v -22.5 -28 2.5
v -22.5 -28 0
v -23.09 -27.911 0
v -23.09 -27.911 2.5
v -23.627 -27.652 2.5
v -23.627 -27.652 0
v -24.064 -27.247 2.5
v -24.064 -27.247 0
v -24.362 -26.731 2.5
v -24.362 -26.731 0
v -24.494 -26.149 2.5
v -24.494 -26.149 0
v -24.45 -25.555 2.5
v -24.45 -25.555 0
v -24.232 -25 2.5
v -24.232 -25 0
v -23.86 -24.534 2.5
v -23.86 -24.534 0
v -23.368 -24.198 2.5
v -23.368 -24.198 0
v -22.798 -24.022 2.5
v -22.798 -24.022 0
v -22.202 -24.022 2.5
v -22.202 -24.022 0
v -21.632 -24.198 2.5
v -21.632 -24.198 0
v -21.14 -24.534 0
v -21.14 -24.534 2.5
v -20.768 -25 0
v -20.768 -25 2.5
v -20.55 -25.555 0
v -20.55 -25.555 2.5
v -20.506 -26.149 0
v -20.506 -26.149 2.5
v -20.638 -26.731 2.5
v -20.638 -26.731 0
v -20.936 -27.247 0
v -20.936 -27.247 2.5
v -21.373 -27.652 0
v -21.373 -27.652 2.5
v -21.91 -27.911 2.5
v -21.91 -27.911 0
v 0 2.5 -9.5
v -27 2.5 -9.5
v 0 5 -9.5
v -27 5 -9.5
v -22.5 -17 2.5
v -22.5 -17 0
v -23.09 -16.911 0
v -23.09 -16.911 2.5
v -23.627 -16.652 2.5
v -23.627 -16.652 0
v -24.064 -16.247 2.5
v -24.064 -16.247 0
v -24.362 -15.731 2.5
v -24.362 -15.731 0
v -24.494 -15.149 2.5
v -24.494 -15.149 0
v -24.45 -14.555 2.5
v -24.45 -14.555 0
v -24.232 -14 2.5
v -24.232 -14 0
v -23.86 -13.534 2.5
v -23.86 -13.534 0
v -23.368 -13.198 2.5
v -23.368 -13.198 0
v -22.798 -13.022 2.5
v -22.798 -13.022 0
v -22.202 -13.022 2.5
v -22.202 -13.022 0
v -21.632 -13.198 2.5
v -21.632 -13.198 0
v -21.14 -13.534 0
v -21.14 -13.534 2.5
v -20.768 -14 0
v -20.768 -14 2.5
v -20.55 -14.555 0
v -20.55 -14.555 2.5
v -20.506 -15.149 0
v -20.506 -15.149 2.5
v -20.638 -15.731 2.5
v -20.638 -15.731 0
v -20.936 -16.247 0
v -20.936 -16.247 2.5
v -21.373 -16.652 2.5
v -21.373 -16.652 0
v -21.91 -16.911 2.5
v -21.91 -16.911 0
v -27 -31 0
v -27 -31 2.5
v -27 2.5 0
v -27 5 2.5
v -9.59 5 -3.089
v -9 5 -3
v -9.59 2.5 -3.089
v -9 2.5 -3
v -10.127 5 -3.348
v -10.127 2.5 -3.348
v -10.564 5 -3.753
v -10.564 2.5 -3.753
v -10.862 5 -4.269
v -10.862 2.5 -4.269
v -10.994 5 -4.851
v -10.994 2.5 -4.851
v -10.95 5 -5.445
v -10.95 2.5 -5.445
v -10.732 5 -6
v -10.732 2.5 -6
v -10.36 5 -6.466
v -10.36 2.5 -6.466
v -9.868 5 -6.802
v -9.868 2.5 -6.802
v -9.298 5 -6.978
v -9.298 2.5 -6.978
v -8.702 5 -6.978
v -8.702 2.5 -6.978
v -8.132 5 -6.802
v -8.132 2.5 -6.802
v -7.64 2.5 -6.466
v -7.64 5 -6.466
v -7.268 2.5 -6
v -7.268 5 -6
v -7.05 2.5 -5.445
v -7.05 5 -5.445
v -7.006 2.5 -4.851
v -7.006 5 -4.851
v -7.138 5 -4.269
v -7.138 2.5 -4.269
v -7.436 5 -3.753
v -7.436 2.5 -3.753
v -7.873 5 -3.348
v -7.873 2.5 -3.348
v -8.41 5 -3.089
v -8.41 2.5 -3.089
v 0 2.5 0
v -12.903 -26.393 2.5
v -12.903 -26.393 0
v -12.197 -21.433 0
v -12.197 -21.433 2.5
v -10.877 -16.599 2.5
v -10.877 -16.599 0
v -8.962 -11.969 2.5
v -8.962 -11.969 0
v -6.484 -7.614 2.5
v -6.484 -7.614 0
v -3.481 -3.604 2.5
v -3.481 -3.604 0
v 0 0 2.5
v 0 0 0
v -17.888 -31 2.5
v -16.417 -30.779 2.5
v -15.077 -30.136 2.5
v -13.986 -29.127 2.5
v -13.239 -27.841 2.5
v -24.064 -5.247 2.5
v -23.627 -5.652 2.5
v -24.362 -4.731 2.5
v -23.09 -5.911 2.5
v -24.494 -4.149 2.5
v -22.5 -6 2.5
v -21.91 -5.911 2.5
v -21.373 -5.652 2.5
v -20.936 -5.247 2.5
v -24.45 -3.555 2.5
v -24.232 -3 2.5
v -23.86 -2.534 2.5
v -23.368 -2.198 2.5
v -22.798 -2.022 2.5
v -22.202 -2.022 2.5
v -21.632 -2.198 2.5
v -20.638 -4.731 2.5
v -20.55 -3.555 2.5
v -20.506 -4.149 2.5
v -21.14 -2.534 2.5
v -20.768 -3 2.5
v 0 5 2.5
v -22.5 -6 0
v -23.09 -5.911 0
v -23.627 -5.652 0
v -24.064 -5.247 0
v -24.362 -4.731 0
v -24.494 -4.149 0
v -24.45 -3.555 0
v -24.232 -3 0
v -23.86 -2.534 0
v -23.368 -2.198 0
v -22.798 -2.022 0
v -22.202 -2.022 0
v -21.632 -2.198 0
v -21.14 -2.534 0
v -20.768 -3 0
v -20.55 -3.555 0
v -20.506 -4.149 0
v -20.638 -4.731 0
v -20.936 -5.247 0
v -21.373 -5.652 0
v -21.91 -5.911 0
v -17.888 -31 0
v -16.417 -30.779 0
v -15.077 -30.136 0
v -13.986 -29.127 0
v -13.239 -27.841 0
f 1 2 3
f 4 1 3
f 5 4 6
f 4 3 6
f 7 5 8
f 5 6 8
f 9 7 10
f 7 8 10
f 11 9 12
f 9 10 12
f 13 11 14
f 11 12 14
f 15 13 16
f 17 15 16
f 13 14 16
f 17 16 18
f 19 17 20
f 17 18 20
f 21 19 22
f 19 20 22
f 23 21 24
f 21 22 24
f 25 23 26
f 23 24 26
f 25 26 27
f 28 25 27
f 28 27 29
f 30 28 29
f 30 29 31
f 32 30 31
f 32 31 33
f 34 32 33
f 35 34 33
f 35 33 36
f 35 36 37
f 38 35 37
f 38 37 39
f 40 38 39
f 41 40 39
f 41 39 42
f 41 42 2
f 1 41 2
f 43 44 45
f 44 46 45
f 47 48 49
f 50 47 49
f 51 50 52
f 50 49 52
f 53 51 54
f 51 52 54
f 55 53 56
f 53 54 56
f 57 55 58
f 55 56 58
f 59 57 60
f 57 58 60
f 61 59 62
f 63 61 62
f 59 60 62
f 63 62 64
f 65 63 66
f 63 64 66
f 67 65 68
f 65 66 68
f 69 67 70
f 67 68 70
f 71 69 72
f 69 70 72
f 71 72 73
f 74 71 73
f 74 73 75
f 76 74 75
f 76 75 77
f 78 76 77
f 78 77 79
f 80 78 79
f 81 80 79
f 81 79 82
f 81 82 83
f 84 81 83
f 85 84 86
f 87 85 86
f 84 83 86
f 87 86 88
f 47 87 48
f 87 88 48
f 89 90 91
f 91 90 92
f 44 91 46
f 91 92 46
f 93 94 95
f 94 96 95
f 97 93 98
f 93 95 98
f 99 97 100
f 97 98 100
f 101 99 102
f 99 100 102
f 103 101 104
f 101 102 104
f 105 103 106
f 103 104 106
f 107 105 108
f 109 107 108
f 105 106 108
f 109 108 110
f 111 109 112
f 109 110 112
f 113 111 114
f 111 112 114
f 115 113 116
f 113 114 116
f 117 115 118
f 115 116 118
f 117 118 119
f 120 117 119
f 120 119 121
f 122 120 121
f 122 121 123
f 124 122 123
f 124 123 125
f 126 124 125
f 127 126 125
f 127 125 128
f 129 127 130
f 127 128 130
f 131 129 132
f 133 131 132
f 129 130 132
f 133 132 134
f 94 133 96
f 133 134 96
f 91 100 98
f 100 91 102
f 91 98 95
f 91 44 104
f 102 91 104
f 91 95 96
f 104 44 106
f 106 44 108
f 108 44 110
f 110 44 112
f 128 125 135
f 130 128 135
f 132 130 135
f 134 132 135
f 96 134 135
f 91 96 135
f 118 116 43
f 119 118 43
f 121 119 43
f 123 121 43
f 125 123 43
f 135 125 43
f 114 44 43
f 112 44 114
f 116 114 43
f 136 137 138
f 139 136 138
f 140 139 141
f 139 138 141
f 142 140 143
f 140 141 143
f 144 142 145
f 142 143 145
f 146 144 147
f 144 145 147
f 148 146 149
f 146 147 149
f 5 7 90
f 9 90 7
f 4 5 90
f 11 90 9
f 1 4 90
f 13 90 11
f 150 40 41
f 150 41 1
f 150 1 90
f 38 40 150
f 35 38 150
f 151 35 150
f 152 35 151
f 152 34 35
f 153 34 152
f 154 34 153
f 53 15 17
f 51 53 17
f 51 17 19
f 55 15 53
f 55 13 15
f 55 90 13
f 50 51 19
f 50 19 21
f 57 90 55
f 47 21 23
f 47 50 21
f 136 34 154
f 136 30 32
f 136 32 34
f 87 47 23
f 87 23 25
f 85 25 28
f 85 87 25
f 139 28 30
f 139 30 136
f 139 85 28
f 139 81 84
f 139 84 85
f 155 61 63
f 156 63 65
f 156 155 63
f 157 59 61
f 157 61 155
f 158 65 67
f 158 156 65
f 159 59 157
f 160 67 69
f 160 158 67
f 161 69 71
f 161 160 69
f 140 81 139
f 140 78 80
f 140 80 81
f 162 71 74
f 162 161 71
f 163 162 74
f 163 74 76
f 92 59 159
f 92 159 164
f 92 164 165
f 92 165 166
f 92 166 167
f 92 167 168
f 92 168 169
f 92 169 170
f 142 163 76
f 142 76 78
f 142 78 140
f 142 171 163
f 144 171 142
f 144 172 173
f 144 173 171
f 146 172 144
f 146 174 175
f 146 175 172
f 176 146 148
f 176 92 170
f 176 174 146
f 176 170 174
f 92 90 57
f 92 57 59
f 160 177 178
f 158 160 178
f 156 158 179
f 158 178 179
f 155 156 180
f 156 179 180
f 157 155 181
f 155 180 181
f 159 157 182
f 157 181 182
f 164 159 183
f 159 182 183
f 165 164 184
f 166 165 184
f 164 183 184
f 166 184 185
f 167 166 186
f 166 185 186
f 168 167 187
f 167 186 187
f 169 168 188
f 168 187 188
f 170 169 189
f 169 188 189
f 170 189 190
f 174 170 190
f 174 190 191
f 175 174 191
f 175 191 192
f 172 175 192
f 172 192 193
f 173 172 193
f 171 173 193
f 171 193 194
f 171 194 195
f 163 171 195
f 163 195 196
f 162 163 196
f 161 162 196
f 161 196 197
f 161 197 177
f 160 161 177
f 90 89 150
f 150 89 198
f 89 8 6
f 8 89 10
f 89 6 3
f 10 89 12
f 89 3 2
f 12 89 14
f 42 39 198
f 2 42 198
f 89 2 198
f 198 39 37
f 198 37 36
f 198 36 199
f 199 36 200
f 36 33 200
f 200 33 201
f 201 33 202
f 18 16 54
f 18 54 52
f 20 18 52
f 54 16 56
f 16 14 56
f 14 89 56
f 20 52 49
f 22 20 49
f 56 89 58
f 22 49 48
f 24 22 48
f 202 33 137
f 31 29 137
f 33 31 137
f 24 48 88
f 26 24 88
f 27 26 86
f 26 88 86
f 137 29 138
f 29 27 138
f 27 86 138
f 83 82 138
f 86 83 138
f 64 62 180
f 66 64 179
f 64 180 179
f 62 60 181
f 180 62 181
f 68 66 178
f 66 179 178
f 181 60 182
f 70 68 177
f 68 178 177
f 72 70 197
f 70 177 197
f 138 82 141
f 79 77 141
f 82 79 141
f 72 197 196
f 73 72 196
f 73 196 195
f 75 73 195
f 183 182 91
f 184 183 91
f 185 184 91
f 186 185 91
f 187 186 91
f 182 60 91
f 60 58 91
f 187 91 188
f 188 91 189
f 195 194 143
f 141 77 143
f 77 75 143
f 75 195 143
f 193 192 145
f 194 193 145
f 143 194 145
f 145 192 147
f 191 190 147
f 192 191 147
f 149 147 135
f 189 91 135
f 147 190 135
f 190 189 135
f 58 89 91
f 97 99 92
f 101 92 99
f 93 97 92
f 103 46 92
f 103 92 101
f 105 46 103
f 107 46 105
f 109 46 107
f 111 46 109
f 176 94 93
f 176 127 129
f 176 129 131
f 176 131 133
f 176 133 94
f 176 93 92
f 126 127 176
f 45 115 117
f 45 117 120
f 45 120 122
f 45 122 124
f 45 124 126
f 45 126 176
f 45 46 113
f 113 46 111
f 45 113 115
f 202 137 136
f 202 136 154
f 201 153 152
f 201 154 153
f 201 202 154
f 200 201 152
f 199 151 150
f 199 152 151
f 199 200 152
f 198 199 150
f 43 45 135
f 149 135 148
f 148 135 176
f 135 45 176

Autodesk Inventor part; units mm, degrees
ref_plane "YZ Plane" through (0, 0, 0) normal (1, 0, 0) x (0, 1, 0)
ref_plane "XZ Plane" through (0, 0, 0) normal (0, 1, 0) x (-1, 0, 0)
ref_plane "XY Plane" through (0, 0, 0) normal (0, 0, 1) x (1, 0, 0)
sketch "Sketch1" plane through (0, 0, 0) normal (0, 0, 1) x (1, 0, 0)
  line L0 (0, 0) -> (0, 5)
  line L1 (0, 5) -> (-27, 5)
  line L2 (-27, 5) -> (-27, -31)
  line L3 (-27, -31) -> (-13, -31)
  arc A0 (0, 0) -> (-12.903, -26.393) centre (26.9732, -29.5372) ccw
  arc A1 (-17.8875, -31) -> (-12.903, -26.393) centre (-17.8875, -26) ccw
  dimension "d3" = 5
  dimension "d4" = 27
  dimension "d5" = 36
  dimension "d6" = 14
  dimension "d9" = 40
  dimension "d10" = 10
extrude "Extrusion1" add sketch "Sketch1" along normal blind 2.5
sketch "Sketch4" plane through (-27, 5, 0) normal (0, 1, 0) x (1, 0, 0)
  circle A0 centre (18, -7.5) radius 2
  line L0 (0, 0) -> (0, -2.5) projected
  line L1 (27, 0) -> (0, 0) projected
  point P0 (0, -12)
  dimension "d20" = 4
  dimension "d21" = 18
  dimension "d22" = 7.5
hole "Hole1" at (-9, 5, 7.5) direction (0, -1, 0) diameter 4 end through all
sketch "Sketch5" plane through (0, 0, 2.5) normal (0, 0, 1) x (1, 0, 0)
  line L0 (-22.5, -4) -> (-22.5, -26) construction
  circle A0 centre (-22.5, -4) radius 2
  circle A1 centre (-22.5, -15) radius 2
  circle A2 centre (-22.5, -26) radius 2
  line L1 (-27, 5) -> (0, 5) projected
  line L2 (-27, 5) -> (-27, -31) projected
  point P0 (0, 0)
  point P1 (-27, 2.5)
  dimension "d30" = 4
  dimension "d31" = 4
  dimension "d32" = 4
  dimension "d33" = 11
  dimension "d34" = 9
  dimension "d35" = 11
  dimension "d36" = 4.5
hole "Hole2" at (-22.5, -4, 2.5) at (-22.5, -15, 2.5) at (-22.5, -26, 2.5) direction (0, 0, -1) diameter 4 end through all
sketch "Sketch6" plane through (-27, 5, 0) normal (0, 1, 0) x (1, 0, 0)
  line L0 (27, -2.5) -> (0, -2.5)
  line L1 (0, -2.5) -> (0, 9.5)
  line L2 (0, 9.5) -> (27, 9.5)
  line L3 (27, 9.5) -> (27, -2.5)
  line L4 (27, -2.5) -> (0, -2.5) projected
  line L5 (27, 0) -> (0, 0)
  dimension "d44" = 0
  dimension "d45" = 12
  dimension "d46" = 27
extrude "Extrusion3" add sketch "Sketch6" against normal blind 2.5 contours L5 L1 L2 L3
sketch "Sketch7" plane through (-27, 5, 2.5) normal (0, 1, 0) x (1, 0, 0)
  circle A0 centre (18, 7.5) radius 2
  line L0 (27, 0) -> (0, 0) projected
  line L1 (0, 12) -> (0, 0) projected
  point P0 (27, 2.5)
  dimension "d49" = 4
  dimension "d50" = 7.5
  dimension "d51" = 18
hole "Hole3" at (-9, 5, -5) direction (0, -1, 0) diameter 4 end through all
properties part number "1-19"
